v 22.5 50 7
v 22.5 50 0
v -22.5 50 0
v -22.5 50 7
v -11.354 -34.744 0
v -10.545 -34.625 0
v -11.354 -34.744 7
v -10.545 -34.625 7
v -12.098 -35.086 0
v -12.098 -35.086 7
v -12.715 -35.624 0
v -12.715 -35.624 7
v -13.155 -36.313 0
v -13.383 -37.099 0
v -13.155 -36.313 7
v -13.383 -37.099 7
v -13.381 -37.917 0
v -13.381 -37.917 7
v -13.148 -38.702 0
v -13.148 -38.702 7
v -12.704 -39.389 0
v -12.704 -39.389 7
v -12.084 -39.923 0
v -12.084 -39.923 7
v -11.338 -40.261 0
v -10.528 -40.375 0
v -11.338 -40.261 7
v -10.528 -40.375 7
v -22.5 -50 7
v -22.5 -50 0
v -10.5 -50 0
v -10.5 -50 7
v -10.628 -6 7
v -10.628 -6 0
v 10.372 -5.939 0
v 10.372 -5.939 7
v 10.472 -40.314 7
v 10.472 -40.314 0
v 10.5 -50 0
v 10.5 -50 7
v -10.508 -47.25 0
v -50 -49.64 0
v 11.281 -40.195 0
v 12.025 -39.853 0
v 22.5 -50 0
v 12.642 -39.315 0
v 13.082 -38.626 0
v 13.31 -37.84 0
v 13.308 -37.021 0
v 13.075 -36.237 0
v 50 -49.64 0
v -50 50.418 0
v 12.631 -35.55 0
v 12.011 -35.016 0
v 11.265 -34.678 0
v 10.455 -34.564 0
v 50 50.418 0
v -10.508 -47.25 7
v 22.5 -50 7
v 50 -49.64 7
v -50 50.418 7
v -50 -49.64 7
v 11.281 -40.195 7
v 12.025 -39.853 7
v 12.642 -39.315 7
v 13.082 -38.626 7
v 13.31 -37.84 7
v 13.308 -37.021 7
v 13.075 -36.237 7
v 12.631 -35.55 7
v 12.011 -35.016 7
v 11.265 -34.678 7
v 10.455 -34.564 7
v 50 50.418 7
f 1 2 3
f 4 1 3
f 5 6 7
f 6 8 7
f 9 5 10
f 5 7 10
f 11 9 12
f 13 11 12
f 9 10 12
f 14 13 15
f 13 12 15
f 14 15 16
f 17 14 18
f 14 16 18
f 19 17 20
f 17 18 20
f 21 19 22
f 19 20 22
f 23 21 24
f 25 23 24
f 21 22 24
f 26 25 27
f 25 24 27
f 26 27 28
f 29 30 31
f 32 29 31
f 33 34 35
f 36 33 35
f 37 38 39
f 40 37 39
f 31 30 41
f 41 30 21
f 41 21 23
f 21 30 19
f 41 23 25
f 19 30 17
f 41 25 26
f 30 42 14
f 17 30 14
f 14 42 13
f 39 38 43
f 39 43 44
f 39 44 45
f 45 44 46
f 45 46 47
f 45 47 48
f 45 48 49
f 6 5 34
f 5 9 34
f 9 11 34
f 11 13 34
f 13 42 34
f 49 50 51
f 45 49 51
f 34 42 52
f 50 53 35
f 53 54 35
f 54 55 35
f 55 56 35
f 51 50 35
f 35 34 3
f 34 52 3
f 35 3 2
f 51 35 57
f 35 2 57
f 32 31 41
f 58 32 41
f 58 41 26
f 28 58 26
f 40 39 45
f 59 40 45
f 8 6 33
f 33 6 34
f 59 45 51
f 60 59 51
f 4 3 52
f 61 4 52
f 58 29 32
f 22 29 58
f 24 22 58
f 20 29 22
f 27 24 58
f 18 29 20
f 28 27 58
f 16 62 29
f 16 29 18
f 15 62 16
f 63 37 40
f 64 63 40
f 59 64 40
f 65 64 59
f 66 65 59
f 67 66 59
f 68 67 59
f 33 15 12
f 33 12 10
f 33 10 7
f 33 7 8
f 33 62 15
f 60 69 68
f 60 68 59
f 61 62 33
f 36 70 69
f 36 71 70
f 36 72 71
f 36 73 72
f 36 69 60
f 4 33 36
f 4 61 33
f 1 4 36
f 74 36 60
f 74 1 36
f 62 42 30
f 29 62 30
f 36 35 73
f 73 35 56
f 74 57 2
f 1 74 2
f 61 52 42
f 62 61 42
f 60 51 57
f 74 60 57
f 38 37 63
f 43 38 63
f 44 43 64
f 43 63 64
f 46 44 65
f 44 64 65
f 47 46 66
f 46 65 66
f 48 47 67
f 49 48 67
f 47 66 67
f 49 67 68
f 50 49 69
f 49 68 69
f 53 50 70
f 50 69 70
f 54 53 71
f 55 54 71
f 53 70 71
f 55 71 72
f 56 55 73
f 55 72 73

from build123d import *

# Parameters (mm, degrees)
F1_DEPTH = 7
F2_D     = 5.75


with BuildPart() as f1:
    # F0 (on Top) → F1 (new body)
    with BuildSketch(Plane.XY):
        Polygon((10.5, -50), (22.5, -50), (22.5, 50), (-14.5, 50), (-22.5, 50), (-22.5, 39), (-22.5, 16), (-22.5, 10), (-22.5, -47.25), (-10.5080957781, -47.25), (-10.6281967604, -6.0001864958), (10.3717142302, -5.9390441602), align=None)
        Polygon((-10.5, -50), (-10.5080957781, -47.25), (-22.5, -47.25), (-22.5, -50), align=None)
        Polygon((-22.5, 39), (-22.5, 50), (-50, 50.4175424576), (-50, -49.6404245496), (-22.5, -50), (-22.5, -47.25), (-22.5, 10), (-22.5, 16), align=None)
        Polygon((22.5, 50), (22.5, -50), (50, -49.6404245496), (50, 50.4175424576), align=None)
    extrude(amount=F1_DEPTH)

    # F2 (through all)
    with Locations(Plane(origin=(0, 0, 0), x_dir=(1, 0, 0), z_dir=(0, 0, -1))):
        with Locations((-10.5364832571, 37.5000529818), (10.4634277335, 37.4389106462)):
            Hole(F2_D / 2)


solid = f1.part
